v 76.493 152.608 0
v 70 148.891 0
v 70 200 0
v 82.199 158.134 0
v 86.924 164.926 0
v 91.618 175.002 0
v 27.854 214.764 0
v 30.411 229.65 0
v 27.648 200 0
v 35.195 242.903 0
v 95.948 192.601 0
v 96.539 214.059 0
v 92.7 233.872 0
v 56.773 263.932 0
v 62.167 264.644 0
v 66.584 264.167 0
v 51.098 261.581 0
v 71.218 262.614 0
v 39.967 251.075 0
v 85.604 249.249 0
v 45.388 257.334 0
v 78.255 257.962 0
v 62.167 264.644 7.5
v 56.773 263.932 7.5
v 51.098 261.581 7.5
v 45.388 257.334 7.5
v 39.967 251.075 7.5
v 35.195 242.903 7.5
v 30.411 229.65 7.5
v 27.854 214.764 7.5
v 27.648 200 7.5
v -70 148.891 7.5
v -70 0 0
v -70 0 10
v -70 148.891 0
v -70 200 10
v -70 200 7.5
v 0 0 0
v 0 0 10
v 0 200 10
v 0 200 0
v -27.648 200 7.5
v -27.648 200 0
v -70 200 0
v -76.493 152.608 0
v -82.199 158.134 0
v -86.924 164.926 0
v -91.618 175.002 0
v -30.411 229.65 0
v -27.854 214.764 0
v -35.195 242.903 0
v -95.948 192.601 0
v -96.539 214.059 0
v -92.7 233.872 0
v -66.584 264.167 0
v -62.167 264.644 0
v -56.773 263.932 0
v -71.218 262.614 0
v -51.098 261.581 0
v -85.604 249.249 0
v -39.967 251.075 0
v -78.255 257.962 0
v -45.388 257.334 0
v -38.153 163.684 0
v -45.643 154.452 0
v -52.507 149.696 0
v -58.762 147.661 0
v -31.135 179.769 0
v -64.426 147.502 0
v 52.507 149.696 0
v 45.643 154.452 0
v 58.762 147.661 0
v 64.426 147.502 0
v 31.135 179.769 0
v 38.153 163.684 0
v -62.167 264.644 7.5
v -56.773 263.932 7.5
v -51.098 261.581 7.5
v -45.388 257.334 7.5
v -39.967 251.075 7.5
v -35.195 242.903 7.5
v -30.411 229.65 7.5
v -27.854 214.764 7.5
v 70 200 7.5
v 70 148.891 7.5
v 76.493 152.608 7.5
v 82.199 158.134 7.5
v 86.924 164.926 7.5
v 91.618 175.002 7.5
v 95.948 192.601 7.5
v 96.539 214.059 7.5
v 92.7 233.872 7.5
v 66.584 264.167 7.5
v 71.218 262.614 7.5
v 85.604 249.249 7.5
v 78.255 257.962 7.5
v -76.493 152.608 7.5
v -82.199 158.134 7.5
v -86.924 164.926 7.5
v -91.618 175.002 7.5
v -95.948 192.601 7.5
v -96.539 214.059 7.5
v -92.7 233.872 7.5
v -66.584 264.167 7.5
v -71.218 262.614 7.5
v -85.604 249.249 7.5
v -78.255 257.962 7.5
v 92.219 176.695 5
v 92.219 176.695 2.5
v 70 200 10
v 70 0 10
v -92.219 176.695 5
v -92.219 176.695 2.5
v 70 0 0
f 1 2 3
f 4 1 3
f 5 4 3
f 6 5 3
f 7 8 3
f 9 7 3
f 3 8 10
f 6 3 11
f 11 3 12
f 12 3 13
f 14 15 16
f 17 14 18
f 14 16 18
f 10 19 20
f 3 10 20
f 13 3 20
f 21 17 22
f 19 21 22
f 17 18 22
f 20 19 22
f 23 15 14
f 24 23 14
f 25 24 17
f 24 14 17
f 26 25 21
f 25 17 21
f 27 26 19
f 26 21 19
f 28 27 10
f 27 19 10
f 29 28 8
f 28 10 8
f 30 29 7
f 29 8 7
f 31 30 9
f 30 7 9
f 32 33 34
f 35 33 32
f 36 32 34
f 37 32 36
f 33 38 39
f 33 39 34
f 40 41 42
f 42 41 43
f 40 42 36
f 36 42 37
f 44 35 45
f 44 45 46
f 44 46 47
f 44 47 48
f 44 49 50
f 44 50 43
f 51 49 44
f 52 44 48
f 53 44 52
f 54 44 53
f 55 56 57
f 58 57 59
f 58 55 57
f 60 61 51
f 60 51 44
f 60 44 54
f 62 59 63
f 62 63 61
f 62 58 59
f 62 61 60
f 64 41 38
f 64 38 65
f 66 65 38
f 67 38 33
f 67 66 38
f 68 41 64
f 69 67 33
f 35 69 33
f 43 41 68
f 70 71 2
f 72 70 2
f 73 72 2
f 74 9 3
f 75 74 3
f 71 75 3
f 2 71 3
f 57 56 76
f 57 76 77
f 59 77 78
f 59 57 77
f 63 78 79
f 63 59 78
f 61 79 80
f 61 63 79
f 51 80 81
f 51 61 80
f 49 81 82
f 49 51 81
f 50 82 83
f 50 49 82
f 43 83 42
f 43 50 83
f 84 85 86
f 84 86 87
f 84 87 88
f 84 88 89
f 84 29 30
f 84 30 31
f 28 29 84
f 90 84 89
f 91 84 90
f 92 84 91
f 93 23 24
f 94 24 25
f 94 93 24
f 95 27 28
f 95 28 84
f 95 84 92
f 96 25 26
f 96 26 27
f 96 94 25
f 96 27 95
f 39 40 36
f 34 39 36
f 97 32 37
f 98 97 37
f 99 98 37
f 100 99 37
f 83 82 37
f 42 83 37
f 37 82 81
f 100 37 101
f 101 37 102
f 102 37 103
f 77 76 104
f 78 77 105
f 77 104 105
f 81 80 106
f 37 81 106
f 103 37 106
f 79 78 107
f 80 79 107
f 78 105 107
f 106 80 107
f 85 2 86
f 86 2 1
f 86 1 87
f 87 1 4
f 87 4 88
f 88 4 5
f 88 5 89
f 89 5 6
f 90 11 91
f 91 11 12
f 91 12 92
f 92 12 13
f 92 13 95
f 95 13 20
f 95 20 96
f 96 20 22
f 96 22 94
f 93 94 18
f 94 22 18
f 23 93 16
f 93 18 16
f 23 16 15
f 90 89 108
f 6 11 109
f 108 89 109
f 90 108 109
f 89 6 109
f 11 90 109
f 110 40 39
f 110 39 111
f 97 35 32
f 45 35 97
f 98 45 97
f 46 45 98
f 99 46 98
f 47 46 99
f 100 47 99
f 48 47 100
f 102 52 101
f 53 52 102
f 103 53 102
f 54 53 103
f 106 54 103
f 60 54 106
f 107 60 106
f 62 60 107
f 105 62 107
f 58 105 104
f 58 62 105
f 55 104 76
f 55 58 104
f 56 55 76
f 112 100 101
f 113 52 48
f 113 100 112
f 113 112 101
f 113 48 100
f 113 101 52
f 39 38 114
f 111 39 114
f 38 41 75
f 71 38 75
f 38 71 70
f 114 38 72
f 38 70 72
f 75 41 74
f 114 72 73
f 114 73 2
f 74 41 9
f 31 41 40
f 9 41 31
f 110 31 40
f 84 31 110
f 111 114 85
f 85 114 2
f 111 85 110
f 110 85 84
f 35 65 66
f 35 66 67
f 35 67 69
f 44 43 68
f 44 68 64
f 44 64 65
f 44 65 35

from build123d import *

# Parameters (mm, degrees)
F1_W     = 70
F1_H     = 200
F2_DEPTH = 10
F4_DEPTH = 7.5


with BuildPart() as f2:
    # F1 (on face) → F2 (new body)
    with BuildSketch(Plane.XY):
        with Locations((35, 100)):
            Rectangle(F1_W, F1_H)
    extrude(amount=F2_DEPTH)

    # F3 (on Top) → F4 (join)
    with BuildSketch(Plane.XY):
        with BuildLine():
            add(Edge.make_bspline(
                [(62.1666908264, 264.6440267563), (2.0624235929, 264.6440267563), (32.1145572097, 176.6945496202), (62.1666908264, 88.745072484), (92.2188244432, 176.6945496202), (122.2709580599, 264.6440267563), (62.1666908264, 264.6440267563)],
                knots=[0, 0, 0, 2.0943951024, 2.0943951024, 4.1887902048, 4.1887902048, 6.2831853072, 6.2831853072, 6.2831853072], degree=2, weights=[1, 0.5, 1, 0.5, 1, 0.5, 1]))
        make_face()
    extrude(amount=F4_DEPTH)

    # F5: F2 across plane


with BuildPart() as f2_1:
    add(f2.part)
    add(f2.part.mirror(Plane.YZ))


solid = f2_1.part
